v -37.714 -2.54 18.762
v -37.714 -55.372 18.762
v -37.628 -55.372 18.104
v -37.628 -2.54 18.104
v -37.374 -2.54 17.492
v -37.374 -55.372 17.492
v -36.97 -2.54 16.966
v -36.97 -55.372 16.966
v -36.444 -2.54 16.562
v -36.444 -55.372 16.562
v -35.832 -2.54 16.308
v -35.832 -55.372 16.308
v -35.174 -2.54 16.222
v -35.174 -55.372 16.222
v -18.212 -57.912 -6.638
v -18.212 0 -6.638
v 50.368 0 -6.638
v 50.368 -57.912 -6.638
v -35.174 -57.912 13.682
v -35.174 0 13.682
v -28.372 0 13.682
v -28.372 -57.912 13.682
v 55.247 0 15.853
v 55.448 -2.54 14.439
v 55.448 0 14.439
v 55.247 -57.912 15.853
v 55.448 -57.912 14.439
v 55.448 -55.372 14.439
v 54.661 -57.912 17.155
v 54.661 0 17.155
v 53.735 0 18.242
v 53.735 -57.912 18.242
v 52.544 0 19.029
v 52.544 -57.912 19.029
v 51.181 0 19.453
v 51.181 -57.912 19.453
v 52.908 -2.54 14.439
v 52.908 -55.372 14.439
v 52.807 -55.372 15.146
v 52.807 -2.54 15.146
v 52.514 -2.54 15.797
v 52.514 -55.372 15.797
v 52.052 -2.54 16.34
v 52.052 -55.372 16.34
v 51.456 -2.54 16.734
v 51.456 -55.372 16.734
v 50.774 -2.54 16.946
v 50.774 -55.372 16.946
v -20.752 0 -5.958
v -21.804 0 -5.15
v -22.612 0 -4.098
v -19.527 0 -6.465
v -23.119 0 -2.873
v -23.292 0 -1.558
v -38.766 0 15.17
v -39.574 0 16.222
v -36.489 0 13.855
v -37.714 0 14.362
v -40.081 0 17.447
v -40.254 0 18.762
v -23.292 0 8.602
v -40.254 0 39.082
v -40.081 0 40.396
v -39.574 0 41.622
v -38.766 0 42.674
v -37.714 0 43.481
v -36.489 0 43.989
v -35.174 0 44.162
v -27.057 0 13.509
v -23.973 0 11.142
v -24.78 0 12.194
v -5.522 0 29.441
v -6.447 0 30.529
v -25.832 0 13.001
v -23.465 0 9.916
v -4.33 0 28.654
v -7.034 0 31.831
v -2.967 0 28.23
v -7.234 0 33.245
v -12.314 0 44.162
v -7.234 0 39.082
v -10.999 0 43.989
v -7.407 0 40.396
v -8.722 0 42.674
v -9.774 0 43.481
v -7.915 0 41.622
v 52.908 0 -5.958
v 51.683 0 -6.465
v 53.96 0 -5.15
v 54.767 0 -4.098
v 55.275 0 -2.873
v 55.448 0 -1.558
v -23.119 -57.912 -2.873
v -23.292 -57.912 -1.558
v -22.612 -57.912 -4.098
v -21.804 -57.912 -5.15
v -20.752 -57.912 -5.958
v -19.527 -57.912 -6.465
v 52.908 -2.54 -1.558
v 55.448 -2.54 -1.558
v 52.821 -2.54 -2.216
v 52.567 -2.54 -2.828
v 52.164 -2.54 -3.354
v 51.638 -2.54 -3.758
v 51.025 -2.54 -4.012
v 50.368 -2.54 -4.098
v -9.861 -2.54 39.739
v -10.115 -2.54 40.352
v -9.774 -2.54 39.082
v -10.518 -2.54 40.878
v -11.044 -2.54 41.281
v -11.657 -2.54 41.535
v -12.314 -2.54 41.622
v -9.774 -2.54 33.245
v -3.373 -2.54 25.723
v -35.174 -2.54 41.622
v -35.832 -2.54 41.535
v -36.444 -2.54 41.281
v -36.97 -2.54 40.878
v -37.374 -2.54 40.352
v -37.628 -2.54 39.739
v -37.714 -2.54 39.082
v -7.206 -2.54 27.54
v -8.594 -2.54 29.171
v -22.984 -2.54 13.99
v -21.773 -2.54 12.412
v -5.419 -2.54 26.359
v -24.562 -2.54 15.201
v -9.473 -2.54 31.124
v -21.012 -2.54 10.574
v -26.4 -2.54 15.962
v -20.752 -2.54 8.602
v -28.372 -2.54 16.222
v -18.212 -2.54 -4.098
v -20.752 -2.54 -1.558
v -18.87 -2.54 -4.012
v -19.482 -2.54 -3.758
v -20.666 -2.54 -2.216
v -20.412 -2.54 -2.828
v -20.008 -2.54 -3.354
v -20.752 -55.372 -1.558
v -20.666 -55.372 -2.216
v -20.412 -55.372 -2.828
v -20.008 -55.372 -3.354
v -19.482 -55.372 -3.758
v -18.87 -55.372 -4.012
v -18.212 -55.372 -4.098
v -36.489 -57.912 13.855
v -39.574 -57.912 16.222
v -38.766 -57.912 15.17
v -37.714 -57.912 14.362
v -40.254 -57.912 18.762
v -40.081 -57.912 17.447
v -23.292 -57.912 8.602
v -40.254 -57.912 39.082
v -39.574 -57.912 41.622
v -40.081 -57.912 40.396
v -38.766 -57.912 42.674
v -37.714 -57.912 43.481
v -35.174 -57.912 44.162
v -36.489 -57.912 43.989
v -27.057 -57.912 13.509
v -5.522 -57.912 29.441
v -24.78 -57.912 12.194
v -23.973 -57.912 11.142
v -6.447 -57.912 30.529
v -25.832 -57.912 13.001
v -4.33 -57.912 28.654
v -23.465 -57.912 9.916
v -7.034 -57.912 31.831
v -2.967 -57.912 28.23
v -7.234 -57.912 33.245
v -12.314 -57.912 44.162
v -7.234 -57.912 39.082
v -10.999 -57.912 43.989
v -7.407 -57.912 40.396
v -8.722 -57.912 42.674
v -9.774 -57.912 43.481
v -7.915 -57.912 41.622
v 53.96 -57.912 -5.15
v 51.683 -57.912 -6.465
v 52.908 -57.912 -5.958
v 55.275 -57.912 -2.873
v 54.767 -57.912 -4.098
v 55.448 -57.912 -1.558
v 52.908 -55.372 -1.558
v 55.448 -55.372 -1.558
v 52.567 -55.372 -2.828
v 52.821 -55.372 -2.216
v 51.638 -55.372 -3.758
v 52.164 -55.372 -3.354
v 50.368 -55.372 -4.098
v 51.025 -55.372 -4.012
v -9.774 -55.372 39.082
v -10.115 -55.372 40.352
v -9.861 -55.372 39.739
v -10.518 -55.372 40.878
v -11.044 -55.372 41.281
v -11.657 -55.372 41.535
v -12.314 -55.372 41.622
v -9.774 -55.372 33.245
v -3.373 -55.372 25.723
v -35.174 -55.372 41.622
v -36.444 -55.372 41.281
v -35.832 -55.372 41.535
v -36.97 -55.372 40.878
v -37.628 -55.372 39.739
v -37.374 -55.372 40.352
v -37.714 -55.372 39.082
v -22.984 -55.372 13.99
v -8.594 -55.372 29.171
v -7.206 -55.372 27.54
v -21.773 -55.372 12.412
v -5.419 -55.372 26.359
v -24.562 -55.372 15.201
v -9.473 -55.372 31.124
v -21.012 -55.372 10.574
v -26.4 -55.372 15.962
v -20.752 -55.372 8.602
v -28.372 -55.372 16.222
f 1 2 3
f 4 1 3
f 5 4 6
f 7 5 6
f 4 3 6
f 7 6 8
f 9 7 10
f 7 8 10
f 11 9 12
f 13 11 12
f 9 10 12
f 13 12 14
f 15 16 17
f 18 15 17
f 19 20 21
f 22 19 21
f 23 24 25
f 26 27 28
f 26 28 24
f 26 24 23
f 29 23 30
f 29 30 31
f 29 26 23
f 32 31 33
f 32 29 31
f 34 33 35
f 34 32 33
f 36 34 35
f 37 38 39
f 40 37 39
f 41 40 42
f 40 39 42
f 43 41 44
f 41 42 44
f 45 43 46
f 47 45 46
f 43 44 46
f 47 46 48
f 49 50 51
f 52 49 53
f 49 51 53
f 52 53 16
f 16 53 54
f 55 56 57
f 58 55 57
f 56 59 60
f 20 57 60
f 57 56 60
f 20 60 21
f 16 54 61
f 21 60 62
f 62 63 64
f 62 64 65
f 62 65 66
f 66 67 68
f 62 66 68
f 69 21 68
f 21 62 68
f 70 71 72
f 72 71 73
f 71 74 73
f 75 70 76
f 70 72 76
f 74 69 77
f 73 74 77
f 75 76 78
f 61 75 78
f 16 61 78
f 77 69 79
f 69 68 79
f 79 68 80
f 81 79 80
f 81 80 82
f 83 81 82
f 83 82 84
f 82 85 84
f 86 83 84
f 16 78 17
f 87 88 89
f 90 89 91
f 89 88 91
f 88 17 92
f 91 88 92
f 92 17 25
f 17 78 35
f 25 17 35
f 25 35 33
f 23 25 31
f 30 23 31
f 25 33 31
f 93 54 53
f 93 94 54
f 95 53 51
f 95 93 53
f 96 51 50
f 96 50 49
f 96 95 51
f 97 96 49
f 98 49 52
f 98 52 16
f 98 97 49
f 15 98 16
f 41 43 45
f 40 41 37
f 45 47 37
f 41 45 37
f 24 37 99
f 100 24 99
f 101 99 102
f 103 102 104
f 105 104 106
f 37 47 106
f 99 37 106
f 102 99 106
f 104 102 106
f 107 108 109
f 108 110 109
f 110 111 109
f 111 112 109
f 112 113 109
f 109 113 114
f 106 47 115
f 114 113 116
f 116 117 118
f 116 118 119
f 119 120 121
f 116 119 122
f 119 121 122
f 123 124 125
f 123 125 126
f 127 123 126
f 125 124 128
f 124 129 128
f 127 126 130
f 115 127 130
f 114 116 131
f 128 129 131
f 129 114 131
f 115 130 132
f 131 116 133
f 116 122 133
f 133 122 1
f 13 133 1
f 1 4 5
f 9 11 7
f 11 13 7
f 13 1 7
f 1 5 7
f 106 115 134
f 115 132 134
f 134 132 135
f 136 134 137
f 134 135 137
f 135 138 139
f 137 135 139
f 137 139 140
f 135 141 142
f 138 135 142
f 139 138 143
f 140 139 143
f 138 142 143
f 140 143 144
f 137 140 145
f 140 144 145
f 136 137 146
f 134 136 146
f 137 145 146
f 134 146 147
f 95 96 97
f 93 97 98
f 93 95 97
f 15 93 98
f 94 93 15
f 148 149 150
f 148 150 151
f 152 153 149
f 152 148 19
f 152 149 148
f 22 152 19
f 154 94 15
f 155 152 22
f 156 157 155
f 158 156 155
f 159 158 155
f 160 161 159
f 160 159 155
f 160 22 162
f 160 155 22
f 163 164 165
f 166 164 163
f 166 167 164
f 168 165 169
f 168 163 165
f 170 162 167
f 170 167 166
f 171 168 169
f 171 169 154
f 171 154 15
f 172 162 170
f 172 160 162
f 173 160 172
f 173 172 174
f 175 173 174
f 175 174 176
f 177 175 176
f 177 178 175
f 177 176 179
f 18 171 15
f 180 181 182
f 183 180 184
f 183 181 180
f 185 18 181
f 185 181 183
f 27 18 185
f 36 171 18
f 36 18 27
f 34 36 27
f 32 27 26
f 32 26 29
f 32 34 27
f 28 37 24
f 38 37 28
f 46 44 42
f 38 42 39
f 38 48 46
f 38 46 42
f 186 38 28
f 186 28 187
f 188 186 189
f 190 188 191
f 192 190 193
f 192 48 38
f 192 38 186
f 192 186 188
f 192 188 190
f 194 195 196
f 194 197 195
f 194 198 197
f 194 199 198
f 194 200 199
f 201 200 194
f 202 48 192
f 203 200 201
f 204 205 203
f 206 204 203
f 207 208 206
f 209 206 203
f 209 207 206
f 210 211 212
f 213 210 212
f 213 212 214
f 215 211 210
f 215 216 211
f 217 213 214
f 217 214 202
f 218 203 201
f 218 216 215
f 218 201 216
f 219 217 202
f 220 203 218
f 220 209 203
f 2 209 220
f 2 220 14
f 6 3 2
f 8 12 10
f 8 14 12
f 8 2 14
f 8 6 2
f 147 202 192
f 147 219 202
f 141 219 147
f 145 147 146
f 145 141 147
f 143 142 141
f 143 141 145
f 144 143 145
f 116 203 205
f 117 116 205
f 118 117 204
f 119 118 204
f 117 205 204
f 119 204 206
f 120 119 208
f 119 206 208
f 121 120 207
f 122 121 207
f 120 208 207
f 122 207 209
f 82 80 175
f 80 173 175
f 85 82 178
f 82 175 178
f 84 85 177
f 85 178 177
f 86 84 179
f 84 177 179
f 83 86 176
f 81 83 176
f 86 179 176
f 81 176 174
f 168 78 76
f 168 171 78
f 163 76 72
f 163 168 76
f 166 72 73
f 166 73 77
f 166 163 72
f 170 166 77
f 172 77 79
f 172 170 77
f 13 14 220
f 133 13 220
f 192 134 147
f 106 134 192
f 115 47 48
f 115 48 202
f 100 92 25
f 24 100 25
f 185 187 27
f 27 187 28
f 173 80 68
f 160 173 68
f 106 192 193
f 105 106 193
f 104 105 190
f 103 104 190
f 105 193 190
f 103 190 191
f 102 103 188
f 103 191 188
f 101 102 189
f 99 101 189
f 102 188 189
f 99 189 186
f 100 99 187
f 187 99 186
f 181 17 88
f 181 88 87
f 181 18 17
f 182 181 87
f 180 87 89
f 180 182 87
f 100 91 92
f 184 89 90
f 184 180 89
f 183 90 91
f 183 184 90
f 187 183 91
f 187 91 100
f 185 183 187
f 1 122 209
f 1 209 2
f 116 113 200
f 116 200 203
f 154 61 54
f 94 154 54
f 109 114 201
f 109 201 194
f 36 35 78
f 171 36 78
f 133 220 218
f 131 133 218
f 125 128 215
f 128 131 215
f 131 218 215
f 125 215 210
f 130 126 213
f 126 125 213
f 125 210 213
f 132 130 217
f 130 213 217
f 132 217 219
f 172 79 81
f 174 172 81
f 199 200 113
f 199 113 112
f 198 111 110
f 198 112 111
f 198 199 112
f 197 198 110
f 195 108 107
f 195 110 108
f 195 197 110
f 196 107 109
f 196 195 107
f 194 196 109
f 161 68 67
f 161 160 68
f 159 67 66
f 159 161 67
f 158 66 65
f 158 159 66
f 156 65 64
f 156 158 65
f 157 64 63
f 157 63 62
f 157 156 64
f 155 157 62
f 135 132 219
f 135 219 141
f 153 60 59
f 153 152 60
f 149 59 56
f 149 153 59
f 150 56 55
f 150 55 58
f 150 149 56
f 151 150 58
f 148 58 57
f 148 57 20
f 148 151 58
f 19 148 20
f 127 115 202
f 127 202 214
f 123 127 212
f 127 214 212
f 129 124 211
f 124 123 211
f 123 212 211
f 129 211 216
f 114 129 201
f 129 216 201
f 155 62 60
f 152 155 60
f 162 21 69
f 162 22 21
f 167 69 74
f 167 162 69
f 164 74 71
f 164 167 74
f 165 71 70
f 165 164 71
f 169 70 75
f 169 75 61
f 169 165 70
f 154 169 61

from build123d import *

# Parameters (mm, degrees)
F1_DEPTH = 57.912
F2_R     = 5.08
F3_T     = -2.54


# Not quite as in the source:
# - a shell that OpenCascade refuses in one call is made with other operations: the cavity is built on its own and cut out


with BuildPart() as f1:
    # F0 (on Front) → F1 (new body)
    with BuildSketch(Plane.XZ):
        Polygon((-7.2342143664, 44.1616670006), (-40.2542143664, 44.1616670006), (-40.2542143664, 13.6816670006), (-23.2922839558, 13.6816670006), (-23.2922839558, -6.6383329994), (55.4477160442, -6.6383329994), (55.4477160442, 18.7616670006), (-7.2342143664, 28.9216670006), align=None)
    extrude(amount=F1_DEPTH)

    # F2
    f2_edges = [f1.edges().sort_by_distance(p)[0] for p in [
        (-7.234214, -28.956, 44.161667),
        (-7.234214, -28.956, 28.921667),
        (55.447716, -28.956, 18.761667),
        (55.447716, -28.956, -6.638333),
        (-40.254214, -28.956, 44.161667),
        (-40.254214, -28.956, 13.681667),
        (-23.292284, -28.956, 13.681667),
        (-23.292284, -28.956, -6.638333),
    ]]
    fillet(f2_edges, radius=F2_R)

    # F3: a shell. OpenCascade refuses it in one call, so the cavity is built on its own and cut out:
    # the body offset inwards by the wall thickness, plus a prism from it out through each open face.
    f3_core = offset(f1.part, amount=F3_T, mode=Mode.PRIVATE)
    f3_exits = [f3_core.faces().sort_by_distance(p)[0] for p in [
        (52.907716, -28.956, 6.440221),
    ]]
    add(f3_core, mode=Mode.SUBTRACT)
    extrude(f3_exits, amount=-F3_T, mode=Mode.SUBTRACT)


solid = f1.part
